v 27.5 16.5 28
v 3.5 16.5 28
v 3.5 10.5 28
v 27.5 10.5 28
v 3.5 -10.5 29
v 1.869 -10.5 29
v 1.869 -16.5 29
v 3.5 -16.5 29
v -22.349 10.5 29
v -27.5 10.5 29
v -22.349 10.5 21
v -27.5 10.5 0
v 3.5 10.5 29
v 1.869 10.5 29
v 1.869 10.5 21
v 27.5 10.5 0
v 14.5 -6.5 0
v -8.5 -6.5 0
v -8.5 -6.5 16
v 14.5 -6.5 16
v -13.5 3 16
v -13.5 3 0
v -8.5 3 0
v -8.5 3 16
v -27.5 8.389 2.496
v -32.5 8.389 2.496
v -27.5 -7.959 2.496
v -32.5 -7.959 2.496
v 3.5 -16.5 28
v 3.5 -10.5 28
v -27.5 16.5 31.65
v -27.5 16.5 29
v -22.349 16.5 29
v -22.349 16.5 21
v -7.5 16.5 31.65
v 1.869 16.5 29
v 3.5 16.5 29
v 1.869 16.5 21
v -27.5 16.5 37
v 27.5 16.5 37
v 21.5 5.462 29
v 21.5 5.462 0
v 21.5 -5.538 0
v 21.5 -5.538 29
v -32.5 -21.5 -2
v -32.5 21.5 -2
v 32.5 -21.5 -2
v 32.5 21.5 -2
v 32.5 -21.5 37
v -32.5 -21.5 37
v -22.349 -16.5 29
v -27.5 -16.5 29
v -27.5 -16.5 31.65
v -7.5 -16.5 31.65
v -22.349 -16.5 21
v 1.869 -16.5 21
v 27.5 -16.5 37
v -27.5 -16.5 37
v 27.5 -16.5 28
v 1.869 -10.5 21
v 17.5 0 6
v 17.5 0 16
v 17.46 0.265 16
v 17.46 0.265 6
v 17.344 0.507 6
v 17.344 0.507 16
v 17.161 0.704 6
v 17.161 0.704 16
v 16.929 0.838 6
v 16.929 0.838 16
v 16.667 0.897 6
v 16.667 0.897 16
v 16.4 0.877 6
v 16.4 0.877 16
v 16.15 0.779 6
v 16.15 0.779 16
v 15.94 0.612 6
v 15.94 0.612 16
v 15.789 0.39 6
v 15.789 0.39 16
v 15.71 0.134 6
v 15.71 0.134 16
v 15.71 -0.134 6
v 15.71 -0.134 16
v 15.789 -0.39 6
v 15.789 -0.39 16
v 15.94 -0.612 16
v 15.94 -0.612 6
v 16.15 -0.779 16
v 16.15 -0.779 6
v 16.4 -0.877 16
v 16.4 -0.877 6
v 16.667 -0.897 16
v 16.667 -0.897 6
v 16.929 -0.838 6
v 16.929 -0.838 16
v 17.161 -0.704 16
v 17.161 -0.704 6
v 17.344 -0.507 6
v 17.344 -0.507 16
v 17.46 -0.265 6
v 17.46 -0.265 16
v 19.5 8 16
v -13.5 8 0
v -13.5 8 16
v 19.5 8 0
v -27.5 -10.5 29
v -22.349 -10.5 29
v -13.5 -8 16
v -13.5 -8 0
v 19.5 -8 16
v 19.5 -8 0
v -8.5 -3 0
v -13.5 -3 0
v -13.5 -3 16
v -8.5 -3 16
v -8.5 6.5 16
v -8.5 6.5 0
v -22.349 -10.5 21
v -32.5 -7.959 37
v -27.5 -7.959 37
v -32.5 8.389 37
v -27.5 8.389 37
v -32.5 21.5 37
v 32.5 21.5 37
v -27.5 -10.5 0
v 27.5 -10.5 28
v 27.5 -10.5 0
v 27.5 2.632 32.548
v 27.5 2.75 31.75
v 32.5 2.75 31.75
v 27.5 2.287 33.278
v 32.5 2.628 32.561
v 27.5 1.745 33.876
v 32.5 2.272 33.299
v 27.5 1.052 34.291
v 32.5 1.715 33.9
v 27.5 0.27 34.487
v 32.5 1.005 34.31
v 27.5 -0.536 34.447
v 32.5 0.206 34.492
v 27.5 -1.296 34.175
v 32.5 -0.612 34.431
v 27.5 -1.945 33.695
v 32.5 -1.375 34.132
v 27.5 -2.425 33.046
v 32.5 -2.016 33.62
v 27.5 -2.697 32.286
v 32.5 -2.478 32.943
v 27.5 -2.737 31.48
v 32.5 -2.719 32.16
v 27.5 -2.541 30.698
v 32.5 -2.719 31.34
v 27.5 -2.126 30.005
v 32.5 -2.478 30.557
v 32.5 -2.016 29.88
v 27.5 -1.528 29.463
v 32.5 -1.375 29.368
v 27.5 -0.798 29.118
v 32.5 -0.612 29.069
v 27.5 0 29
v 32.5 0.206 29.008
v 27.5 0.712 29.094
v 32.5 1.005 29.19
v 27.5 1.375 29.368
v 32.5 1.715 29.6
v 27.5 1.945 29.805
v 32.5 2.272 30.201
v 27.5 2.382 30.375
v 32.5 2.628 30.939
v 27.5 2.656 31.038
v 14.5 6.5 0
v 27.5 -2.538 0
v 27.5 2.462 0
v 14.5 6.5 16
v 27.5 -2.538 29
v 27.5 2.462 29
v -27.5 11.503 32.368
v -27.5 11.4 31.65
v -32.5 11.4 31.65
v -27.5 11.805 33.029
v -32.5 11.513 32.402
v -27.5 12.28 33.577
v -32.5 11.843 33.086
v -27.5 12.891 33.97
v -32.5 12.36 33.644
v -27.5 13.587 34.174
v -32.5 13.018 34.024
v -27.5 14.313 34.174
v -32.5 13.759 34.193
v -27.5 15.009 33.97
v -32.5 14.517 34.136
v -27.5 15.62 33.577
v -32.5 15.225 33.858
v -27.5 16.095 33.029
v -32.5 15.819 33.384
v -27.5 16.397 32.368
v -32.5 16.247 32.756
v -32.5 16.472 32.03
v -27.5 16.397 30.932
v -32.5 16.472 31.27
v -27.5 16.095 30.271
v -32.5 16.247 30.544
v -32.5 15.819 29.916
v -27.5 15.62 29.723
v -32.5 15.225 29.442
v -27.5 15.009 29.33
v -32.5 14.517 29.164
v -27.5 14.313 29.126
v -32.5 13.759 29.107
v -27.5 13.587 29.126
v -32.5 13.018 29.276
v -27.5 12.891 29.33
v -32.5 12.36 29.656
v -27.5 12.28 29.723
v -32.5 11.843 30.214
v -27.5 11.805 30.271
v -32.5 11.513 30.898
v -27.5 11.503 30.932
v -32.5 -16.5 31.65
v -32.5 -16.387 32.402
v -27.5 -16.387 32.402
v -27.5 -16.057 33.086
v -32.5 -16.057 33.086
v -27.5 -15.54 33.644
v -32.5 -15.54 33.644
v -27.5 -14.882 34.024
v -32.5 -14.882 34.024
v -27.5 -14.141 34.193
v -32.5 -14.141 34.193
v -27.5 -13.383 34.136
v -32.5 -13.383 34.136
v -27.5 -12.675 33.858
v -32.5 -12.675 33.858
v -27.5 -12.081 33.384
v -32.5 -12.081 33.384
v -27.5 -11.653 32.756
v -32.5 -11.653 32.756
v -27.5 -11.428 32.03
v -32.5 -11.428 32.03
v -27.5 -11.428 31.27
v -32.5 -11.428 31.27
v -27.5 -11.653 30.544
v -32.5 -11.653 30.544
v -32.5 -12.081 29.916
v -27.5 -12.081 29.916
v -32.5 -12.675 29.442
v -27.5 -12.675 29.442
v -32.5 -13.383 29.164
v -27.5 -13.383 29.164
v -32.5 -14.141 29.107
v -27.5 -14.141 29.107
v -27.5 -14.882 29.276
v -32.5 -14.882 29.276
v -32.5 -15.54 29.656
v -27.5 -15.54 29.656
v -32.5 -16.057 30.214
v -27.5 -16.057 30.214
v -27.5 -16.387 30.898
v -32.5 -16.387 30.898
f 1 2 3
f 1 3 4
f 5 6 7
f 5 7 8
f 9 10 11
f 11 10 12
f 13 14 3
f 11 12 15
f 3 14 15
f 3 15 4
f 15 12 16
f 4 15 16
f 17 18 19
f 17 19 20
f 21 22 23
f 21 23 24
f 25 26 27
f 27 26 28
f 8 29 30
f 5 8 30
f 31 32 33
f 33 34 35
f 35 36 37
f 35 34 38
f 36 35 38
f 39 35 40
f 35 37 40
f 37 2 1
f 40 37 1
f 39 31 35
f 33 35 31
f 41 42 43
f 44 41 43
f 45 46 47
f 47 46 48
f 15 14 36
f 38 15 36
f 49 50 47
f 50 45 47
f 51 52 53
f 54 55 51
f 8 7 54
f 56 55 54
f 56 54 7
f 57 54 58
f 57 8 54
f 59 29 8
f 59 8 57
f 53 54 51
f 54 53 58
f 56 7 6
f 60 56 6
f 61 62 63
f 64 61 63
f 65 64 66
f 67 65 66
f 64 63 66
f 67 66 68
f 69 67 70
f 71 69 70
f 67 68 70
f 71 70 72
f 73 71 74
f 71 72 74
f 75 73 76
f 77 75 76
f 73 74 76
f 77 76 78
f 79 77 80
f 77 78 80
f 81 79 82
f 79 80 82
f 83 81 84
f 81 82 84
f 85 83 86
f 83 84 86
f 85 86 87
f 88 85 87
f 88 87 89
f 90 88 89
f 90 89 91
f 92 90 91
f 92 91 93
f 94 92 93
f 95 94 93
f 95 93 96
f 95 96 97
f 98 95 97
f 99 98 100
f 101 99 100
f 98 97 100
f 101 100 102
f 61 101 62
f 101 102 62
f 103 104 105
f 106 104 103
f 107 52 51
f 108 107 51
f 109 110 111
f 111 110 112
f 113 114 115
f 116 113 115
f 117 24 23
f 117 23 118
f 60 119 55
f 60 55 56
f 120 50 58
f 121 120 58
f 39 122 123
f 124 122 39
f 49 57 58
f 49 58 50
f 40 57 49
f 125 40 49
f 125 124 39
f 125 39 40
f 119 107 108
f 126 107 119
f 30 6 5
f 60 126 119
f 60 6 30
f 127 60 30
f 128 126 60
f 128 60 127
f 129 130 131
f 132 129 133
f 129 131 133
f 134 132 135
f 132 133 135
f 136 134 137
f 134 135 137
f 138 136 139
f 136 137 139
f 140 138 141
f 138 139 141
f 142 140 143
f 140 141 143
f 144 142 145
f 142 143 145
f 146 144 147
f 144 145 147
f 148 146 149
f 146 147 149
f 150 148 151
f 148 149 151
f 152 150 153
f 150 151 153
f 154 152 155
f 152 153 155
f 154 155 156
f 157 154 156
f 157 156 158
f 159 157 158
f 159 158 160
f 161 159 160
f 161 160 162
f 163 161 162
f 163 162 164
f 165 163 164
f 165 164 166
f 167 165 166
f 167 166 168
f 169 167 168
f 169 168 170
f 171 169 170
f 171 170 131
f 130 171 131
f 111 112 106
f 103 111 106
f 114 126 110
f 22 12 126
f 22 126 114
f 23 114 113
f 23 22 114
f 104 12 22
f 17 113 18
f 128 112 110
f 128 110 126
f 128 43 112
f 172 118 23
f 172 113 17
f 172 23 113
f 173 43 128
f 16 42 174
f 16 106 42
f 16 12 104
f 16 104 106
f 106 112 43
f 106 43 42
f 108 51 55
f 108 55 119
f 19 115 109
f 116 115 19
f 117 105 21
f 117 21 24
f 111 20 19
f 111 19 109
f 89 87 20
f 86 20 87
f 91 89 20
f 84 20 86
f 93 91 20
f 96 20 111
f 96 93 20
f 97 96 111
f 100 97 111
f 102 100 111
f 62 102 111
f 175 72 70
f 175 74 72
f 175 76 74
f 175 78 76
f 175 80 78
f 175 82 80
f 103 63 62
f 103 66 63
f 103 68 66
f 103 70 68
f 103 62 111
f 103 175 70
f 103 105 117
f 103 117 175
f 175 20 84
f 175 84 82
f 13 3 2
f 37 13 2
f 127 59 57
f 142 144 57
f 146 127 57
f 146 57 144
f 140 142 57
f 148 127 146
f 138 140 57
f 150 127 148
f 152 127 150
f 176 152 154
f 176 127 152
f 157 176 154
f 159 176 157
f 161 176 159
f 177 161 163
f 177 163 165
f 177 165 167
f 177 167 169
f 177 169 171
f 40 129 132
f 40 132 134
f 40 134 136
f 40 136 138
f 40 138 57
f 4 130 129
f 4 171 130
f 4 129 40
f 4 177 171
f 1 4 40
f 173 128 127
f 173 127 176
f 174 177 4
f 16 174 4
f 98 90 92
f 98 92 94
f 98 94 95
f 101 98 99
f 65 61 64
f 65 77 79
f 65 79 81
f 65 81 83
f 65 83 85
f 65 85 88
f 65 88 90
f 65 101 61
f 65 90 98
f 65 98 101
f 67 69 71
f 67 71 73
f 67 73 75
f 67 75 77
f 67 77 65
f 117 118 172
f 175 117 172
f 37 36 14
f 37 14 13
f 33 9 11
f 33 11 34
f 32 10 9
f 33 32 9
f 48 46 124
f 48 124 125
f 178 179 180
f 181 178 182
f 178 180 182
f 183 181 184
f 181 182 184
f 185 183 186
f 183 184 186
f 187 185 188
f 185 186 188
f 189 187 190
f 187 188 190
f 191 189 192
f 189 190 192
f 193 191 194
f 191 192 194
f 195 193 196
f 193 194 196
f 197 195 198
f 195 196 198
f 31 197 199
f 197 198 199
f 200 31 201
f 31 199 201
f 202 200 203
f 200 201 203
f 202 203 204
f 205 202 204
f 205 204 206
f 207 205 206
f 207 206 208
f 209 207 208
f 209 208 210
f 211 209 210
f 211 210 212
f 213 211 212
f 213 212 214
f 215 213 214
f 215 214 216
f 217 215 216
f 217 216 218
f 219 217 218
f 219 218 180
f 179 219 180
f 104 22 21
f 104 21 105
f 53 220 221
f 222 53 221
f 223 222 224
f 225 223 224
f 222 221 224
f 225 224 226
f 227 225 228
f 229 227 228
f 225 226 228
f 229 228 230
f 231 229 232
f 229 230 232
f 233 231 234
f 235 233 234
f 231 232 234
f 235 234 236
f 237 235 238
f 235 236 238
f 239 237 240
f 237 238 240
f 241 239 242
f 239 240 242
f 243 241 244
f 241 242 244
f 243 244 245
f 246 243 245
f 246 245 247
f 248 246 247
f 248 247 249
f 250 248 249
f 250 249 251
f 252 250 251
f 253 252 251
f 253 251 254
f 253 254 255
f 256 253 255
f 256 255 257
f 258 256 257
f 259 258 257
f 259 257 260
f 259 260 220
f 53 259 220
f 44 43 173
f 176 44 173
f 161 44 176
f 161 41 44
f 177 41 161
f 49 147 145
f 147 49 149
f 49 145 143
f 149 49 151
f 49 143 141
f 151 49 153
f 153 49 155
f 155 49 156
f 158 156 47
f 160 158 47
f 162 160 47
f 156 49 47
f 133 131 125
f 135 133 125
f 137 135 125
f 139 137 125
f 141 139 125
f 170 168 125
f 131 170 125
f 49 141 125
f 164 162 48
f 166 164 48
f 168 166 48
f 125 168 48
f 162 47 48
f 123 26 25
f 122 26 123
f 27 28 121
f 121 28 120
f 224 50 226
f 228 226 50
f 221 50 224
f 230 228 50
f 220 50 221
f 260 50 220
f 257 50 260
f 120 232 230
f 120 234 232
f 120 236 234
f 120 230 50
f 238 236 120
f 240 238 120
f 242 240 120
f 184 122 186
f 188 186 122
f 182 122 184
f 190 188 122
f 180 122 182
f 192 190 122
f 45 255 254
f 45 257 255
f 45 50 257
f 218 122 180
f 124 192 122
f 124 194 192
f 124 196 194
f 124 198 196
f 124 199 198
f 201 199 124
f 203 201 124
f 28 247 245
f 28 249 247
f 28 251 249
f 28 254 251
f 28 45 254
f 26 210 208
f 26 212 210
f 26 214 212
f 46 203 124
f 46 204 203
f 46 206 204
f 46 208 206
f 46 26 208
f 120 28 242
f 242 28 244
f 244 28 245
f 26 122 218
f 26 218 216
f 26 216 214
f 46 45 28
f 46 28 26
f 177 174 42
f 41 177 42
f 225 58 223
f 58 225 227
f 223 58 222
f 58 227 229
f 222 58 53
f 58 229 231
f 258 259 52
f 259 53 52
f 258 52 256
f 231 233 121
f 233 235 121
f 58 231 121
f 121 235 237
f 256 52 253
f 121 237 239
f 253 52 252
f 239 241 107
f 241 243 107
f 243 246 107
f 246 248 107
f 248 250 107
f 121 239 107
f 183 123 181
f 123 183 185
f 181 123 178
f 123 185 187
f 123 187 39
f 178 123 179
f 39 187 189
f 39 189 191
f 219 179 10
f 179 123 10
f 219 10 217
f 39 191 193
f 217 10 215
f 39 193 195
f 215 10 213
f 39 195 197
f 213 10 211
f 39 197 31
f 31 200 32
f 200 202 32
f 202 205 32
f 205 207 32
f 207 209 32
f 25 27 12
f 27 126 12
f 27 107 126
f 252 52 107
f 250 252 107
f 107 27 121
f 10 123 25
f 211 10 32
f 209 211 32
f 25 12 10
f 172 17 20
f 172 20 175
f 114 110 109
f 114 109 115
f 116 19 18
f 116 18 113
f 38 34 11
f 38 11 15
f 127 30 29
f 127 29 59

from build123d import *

# Parameters (mm, degrees)
F0_W      = 65
F0_H      = 43
F1_DEPTH  = 2
F2_W      = 65
F2_H      = 43
F2_W_2    = 55
F2_H_2    = 33
F3_DEPTH  = 37
F4_W      = 33
F4_H      = 16
F4_W_2    = 23
F4_H_2    = 13
F5_DEPTH  = 16
F6_R      = 0.9
F7_DEPTH  = 10
F8_W      = 55
F8_H      = 6
F9_DEPTH  = 28
F10_R     = 2.55
F11_DEPTH = 25
F12_R     = 2.75
F13_DEPTH = 25
F15_DEPTH = 29
F16_W     = 31
F16_H     = 6
F17_DEPTH = 1
F18_W     = 16.348152
F18_H     = 34.503732
F19_DEPTH = 5
F20_W     = 24.218268
F20_H     = 6
F21_DEPTH = 8
F22_W     = 6
F22_H     = 16
F23_DEPTH = 5


with BuildPart() as f1:
    # F0 (on Top) → F1 (new body)
    with BuildSketch(Plane.XY):
        Rectangle(F0_W, F0_H)
    extrude(amount=-F1_DEPTH)

    # F2 (on face) → F3 (join)
    with BuildSketch(Plane.XY):
        Rectangle(F2_W, F2_H)
        Rectangle(F2_W_2, F2_H_2, mode=Mode.SUBTRACT)
    extrude(amount=F3_DEPTH)

    # F4 (on face) → F5 (join)
    with BuildSketch(Plane.XY):
        with Locations((3, 0)):
            Rectangle(F4_W, F4_H)
        with Locations((3, 0)):
            Rectangle(F4_W_2, F4_H_2, mode=Mode.SUBTRACT)
    extrude(amount=F5_DEPTH)

    # F6 (on face) → F7 (cut)
    with BuildSketch(Plane.XY.offset(16)):
        with Locations((16.6, 0)):
            Circle(F6_R)
        with Locations((-10.6, 0)):
            Circle(F6_R)
    extrude(amount=-F7_DEPTH, mode=Mode.SUBTRACT)

    # F8 (on face) → F9 (join)
    with BuildSketch(Plane.XY):
        with Locations((0, -13.5)):
            Rectangle(F8_W, F8_H)
        with Locations((0, 13.5)):
            Rectangle(F8_W, F8_H)
    extrude(amount=F9_DEPTH)

    # F10 (on face) → F11 (cut)
    with BuildSketch(Plane(origin=(-32.5, 0, 0), x_dir=(0, -1, 0), z_dir=(-1, 0, 0))):
        with Locations((13.95, 31.65)):
            Circle(F10_R)
        with Locations((-13.95, 31.65)):
            Circle(F10_R)
    extrude(amount=-F11_DEPTH, mode=Mode.SUBTRACT)

    # F12 (on face) → F13 (cut)
    with BuildSketch(Plane.YZ.offset(32.5)):
        with Locations((0, 31.75)):
            Circle(F12_R)
    extrude(amount=-F13_DEPTH, mode=Mode.SUBTRACT)

    # F14 (on face) → F15 (join)
    with BuildSketch(Plane.XY):
        Polygon((21.5, -5.537505), (27.5, -2.537505), (27.5, 2.462495), (21.5, 5.462495), align=None)
    extrude(amount=F15_DEPTH)

    # F16 (on face) → F17 (join)
    with BuildSketch(Plane.XY.offset(28)):
        with Locations((-12, -13.5)):
            Rectangle(F16_W, F16_H)
        with Locations((-12, 13.5)):
            Rectangle(F16_W, F16_H)
    extrude(amount=F17_DEPTH)

    # F18 (on face) → F19 (cut)
    with BuildSketch(Plane(origin=(-32.5, 0, 0), x_dir=(0, -1, 0), z_dir=(-1, 0, 0))):
        with Locations((-0.215107, 19.748134)):
            Rectangle(F18_W, F18_H)
    extrude(amount=-F19_DEPTH, mode=Mode.SUBTRACT)

    # F20 (on face) → F21 (cut)
    with BuildSketch(Plane.XY.offset(29)):
        with Locations((-10.239939, 13.5)):
            Rectangle(F20_W, F20_H)
        with Locations((-10.239939, -13.5)):
            Rectangle(F20_W, F20_H)
    extrude(amount=-F21_DEPTH, mode=Mode.SUBTRACT)

    # F22 (on face) → F23 (cut)
    with BuildSketch(Plane(origin=(-13.5, 0, 0), x_dir=(0, -1, 0), z_dir=(-1, 0, 0))):
        with Locations((0, 8)):
            Rectangle(F22_W, F22_H)
    extrude(amount=-F23_DEPTH, mode=Mode.SUBTRACT)


solid = f1.part
